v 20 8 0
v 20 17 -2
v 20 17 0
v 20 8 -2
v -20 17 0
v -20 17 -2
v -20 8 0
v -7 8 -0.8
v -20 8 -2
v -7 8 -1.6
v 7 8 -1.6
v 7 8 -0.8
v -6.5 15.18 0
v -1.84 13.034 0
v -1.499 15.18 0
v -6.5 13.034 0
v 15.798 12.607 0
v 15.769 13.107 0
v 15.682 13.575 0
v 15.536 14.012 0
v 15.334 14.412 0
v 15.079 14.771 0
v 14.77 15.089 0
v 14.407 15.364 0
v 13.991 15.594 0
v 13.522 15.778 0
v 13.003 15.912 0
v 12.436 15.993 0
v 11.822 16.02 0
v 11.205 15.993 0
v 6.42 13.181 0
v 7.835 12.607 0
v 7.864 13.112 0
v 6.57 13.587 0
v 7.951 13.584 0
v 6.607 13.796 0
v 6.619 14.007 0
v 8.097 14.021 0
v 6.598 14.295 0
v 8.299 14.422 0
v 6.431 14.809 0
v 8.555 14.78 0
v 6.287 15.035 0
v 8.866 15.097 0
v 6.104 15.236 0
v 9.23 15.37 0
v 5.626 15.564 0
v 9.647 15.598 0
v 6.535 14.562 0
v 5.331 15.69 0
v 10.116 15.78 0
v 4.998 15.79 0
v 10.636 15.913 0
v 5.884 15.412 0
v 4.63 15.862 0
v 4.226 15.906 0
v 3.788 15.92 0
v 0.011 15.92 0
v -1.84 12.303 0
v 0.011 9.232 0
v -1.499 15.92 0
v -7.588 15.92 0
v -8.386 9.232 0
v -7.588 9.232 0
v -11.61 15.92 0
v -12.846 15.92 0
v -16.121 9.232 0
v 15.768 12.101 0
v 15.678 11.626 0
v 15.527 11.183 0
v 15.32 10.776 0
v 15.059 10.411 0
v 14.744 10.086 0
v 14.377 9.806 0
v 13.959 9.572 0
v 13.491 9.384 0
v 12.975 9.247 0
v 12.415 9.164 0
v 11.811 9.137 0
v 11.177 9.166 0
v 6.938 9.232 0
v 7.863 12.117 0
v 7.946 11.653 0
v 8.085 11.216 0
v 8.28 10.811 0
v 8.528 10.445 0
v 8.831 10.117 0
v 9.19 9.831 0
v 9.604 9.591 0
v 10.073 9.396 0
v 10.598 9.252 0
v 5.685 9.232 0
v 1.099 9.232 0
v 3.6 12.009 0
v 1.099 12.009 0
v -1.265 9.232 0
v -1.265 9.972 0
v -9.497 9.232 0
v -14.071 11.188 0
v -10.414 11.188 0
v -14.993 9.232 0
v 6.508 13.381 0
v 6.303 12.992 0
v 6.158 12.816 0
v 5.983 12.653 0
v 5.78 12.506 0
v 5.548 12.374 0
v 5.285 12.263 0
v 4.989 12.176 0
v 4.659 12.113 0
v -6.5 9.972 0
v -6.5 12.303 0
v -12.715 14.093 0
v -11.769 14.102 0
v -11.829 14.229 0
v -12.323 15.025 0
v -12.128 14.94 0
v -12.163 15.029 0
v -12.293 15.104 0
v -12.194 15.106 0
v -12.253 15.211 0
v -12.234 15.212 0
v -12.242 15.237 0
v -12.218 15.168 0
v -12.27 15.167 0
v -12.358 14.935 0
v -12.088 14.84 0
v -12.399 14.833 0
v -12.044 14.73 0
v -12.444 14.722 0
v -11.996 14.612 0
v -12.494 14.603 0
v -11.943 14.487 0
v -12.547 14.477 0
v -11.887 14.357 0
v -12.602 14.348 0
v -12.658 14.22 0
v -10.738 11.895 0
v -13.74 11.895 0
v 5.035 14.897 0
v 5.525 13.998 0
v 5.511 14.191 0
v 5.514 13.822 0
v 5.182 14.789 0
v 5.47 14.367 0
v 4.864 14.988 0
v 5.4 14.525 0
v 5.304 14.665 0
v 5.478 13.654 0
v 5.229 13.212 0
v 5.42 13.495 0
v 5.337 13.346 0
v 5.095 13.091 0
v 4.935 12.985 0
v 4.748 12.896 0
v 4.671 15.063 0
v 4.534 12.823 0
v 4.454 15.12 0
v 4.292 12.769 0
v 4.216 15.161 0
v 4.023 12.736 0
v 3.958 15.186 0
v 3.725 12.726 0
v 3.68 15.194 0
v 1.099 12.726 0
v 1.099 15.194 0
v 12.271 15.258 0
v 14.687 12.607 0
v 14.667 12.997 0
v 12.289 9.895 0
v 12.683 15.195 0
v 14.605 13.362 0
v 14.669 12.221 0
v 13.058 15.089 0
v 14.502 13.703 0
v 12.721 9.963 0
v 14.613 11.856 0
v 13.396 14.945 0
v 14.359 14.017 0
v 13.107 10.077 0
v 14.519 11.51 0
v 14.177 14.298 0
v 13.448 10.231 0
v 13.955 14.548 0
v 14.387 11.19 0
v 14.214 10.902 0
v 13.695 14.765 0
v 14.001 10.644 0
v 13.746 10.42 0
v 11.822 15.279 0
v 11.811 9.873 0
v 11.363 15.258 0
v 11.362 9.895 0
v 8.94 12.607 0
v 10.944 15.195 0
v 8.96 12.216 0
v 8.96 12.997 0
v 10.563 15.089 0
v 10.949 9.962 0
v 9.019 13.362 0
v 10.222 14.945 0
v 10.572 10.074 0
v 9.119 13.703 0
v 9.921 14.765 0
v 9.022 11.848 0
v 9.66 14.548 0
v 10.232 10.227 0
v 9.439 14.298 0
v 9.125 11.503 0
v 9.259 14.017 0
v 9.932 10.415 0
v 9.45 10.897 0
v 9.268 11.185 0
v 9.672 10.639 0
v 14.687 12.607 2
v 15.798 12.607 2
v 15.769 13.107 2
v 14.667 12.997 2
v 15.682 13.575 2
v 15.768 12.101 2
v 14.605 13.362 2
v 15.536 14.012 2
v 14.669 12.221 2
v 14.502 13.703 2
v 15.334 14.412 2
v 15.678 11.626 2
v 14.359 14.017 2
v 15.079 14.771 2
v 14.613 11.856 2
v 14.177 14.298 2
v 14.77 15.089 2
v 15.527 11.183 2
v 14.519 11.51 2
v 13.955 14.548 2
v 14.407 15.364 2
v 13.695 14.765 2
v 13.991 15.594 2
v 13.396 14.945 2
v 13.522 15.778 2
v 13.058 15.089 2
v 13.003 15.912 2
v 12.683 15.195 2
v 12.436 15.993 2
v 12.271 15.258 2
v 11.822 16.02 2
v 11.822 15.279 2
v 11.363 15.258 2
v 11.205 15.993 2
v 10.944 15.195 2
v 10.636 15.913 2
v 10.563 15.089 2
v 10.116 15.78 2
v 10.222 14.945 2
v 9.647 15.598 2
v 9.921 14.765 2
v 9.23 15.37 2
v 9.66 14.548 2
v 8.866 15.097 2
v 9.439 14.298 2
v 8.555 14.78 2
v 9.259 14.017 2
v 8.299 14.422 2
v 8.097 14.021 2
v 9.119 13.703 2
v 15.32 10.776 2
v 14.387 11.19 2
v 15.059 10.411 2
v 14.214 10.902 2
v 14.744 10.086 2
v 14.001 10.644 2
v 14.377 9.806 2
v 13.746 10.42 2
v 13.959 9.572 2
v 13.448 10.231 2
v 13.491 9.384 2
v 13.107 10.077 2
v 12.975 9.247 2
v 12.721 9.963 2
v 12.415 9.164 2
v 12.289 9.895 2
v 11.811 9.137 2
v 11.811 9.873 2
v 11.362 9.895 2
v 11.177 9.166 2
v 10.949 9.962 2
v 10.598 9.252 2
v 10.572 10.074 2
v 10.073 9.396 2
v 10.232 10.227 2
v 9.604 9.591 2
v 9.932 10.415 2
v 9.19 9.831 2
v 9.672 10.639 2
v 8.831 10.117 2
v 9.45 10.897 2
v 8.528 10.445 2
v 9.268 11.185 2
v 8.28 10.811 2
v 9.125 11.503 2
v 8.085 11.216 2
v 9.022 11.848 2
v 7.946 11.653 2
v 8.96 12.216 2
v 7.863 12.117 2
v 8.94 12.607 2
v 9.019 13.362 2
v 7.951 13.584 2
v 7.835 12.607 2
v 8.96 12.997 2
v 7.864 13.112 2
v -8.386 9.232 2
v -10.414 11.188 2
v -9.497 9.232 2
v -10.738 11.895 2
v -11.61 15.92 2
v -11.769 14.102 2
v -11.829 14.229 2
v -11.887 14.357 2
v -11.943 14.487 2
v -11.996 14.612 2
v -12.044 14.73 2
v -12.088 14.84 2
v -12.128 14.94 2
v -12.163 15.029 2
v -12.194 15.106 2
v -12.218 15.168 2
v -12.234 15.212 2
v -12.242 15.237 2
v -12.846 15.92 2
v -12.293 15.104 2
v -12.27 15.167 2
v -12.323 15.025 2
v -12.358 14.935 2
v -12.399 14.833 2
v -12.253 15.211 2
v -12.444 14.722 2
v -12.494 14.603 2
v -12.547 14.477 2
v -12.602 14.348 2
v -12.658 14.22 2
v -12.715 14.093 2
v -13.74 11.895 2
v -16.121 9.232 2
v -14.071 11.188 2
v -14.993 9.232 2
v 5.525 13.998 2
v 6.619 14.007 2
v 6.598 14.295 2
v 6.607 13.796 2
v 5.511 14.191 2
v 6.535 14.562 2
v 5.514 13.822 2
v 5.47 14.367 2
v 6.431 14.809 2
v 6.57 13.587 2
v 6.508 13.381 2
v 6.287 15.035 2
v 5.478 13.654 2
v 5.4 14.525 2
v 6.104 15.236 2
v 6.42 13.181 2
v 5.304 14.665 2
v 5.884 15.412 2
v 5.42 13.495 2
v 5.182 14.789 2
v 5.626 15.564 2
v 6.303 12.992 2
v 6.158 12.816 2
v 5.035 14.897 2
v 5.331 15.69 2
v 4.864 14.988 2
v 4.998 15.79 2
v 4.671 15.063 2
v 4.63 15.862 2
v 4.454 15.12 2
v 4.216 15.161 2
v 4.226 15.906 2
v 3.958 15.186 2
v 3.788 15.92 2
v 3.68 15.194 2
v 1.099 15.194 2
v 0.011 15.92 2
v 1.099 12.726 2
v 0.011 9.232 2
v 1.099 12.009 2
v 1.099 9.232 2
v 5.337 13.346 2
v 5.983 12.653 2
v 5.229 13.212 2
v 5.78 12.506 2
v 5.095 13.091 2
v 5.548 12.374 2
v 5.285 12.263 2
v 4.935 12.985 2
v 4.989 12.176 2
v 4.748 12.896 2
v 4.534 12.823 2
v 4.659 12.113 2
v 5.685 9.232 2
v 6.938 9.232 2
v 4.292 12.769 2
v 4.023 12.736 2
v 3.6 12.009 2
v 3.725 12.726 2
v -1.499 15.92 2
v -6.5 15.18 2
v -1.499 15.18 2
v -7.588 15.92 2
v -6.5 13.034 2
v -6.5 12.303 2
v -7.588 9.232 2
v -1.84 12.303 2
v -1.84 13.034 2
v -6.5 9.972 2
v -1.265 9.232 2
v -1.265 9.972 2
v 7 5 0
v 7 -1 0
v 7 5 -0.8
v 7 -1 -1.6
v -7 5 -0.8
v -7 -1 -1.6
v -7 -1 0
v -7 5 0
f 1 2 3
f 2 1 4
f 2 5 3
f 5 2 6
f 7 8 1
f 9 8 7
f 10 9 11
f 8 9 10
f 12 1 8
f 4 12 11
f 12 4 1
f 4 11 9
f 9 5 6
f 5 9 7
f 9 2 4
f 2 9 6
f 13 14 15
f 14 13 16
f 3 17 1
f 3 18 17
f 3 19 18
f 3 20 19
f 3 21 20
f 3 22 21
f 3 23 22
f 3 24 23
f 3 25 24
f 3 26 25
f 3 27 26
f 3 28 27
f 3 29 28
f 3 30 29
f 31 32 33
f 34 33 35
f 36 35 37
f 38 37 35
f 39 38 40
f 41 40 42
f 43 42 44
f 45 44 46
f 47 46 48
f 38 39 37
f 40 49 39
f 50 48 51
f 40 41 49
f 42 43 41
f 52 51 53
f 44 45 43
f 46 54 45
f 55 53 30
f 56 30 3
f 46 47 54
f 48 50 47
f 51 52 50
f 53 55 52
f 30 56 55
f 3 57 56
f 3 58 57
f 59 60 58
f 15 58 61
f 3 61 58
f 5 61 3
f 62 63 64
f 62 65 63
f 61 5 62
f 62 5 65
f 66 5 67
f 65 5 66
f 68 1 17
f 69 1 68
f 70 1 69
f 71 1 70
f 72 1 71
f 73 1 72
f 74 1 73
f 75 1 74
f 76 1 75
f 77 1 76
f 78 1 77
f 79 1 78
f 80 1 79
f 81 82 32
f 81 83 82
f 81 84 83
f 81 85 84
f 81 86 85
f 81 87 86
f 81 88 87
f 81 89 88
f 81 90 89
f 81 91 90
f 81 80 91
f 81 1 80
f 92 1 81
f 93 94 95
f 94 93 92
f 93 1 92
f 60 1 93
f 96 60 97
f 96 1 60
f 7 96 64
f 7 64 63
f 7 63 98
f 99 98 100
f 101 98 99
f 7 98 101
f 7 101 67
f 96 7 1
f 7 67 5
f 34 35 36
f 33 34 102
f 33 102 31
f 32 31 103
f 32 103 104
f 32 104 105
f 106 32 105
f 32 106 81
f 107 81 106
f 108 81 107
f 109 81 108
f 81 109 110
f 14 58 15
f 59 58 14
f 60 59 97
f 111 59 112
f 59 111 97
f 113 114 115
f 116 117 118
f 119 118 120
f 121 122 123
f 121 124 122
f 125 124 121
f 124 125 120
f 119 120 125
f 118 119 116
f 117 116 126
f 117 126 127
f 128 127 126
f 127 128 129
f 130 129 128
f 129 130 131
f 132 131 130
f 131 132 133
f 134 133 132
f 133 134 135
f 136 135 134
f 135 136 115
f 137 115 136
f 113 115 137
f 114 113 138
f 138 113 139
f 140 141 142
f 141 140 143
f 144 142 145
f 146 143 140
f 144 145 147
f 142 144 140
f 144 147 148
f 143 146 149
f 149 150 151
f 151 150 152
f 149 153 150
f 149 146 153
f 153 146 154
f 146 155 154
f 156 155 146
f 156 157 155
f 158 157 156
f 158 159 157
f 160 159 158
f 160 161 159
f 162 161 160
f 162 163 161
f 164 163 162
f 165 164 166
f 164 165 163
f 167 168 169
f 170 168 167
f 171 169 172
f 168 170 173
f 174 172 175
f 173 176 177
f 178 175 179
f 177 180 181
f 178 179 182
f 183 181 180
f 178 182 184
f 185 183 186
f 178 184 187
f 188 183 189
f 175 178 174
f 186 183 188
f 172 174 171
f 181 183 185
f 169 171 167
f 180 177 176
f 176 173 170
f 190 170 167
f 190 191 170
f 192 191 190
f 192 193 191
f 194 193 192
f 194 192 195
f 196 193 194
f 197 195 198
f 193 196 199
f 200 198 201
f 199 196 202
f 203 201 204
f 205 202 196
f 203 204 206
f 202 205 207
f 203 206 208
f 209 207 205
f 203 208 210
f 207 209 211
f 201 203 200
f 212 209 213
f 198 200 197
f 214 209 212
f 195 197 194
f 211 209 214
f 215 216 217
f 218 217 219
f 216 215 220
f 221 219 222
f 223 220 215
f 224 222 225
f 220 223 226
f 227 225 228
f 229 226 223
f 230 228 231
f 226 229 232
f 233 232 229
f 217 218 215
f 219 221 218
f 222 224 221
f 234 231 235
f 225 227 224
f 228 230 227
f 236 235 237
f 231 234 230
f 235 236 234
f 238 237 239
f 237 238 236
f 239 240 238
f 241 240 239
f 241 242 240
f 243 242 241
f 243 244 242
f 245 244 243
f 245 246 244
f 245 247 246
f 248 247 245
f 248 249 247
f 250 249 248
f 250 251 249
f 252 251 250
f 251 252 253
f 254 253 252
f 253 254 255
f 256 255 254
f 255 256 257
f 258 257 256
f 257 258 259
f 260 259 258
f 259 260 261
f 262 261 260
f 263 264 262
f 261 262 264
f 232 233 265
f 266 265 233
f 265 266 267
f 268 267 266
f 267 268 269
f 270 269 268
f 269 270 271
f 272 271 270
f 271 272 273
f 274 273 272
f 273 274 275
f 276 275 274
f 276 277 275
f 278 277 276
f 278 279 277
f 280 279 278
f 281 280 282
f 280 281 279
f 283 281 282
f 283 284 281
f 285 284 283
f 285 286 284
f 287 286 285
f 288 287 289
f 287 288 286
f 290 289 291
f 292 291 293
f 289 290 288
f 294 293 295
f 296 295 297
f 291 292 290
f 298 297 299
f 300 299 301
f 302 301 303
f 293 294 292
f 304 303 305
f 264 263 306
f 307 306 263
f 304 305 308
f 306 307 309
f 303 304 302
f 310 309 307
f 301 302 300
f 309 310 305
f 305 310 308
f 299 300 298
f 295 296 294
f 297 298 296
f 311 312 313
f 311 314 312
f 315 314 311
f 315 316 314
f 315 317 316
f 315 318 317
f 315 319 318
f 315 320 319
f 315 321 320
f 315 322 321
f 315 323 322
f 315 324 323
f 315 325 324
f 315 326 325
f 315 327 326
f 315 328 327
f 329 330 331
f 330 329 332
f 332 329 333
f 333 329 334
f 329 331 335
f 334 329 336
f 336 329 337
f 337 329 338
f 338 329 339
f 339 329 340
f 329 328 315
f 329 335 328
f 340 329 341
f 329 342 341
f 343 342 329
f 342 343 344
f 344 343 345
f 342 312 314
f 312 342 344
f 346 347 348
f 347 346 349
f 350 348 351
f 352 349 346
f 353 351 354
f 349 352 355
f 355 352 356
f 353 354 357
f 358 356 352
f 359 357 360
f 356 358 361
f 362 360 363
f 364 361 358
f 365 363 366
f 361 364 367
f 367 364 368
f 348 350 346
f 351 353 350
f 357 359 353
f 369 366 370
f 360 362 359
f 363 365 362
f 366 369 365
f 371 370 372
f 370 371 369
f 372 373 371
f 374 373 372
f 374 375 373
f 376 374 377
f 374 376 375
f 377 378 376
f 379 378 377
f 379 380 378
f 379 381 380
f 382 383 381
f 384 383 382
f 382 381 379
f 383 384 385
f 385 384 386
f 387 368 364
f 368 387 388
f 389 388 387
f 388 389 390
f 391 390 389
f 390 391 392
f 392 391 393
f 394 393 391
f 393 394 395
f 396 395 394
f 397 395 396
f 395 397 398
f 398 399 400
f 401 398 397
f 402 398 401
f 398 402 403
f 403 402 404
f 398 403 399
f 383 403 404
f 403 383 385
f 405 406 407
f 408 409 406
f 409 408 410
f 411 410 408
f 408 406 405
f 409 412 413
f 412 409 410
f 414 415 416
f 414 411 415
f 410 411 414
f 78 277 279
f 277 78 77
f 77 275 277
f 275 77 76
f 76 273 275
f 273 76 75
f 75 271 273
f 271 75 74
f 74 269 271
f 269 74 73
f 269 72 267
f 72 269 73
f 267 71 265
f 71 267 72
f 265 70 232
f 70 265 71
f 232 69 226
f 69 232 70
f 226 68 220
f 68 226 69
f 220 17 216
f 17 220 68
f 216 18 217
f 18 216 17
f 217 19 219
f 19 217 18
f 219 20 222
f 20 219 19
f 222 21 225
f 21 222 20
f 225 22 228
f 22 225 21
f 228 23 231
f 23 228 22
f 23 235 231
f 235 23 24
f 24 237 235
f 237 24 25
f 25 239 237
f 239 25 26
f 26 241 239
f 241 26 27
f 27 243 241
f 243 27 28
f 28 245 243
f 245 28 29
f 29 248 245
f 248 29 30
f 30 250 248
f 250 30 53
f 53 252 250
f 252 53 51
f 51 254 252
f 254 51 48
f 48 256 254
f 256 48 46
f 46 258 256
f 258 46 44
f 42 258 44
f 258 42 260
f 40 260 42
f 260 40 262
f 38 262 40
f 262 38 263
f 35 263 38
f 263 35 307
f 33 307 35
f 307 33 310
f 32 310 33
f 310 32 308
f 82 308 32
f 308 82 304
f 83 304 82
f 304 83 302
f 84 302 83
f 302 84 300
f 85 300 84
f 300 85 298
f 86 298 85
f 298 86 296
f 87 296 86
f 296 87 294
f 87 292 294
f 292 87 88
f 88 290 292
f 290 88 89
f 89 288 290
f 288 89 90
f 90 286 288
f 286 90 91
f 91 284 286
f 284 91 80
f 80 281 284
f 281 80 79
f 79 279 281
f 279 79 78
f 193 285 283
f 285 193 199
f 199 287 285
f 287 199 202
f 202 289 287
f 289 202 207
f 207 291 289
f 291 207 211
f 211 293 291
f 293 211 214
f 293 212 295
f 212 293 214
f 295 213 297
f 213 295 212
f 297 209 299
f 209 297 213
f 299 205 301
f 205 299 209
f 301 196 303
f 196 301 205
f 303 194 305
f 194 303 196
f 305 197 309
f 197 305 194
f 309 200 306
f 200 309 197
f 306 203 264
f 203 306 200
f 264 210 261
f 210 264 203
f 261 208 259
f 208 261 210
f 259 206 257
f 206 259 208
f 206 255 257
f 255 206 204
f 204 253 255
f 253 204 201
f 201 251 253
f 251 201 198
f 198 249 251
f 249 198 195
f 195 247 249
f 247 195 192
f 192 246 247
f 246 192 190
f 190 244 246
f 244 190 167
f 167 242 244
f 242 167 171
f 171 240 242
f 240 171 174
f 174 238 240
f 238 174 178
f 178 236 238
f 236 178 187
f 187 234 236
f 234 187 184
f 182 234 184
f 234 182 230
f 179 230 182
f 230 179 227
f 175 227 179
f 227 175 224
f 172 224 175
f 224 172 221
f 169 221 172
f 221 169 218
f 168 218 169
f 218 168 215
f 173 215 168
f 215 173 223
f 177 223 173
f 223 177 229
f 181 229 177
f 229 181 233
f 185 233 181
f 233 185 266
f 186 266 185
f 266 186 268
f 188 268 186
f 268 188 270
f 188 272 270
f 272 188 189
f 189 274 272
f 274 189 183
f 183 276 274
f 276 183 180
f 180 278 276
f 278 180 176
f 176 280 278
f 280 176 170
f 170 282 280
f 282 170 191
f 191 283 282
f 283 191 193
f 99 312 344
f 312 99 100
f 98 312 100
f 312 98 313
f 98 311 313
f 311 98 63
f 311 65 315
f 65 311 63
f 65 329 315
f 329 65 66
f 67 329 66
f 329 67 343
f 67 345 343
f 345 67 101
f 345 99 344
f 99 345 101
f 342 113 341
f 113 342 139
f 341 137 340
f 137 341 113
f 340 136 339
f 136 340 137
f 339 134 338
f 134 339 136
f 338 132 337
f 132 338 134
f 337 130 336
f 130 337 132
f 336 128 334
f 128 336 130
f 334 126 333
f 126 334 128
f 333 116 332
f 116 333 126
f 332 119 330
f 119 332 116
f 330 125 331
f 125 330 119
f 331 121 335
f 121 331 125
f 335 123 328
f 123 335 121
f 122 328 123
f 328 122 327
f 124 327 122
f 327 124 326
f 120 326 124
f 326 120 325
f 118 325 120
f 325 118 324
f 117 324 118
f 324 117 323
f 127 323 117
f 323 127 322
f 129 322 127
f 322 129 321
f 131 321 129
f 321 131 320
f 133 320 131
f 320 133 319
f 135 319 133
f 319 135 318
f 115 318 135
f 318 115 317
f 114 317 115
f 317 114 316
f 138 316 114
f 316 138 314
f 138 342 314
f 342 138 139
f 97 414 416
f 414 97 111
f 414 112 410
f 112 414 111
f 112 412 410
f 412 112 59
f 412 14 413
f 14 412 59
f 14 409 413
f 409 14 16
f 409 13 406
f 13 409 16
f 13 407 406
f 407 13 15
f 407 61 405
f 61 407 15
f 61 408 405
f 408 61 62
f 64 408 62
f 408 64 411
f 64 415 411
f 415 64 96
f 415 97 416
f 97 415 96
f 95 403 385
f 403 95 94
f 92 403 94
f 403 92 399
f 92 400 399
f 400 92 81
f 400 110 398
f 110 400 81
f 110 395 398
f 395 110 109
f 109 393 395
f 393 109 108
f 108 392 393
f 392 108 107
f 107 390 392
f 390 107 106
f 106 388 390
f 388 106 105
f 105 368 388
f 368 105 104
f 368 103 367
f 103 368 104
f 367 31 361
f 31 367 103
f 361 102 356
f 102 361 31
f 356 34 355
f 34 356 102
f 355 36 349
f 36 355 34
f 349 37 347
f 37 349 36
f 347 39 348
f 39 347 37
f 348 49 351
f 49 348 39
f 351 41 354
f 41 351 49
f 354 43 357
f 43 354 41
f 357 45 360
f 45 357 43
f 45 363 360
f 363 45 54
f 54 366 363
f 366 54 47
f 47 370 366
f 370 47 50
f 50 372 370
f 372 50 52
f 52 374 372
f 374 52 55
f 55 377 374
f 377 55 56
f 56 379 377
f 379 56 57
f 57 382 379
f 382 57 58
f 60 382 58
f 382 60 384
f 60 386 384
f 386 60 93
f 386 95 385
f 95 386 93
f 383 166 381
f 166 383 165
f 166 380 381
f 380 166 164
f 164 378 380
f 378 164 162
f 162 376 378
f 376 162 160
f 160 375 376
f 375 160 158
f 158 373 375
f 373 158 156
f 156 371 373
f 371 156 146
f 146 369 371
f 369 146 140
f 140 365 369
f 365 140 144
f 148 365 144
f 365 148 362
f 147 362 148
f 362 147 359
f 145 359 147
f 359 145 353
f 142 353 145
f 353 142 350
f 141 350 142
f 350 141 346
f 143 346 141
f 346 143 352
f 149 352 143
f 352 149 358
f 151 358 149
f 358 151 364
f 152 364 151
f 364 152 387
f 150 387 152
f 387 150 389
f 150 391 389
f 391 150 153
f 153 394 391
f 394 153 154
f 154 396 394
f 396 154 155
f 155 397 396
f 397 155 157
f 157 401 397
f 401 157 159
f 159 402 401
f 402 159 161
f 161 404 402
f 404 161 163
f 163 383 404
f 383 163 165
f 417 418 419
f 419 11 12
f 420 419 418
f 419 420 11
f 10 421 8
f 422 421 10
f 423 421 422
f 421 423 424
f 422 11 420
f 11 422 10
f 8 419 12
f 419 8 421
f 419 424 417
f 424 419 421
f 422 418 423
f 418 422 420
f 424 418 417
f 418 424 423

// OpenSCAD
// Aero Dock Signage - KLG 2019

echo(version=version());

font = "Liberation Sans"; //["Liberation Sans", "Liberation Sans:style=Bold", "Liberation Sans:style=Italic", "Liberation Mono", "Liberation Serif"]

name = "AERO";
cube_w = 40;
cube_d = 2;
cube_h = 9;
letter_size = cube_h -2;
letter_height = cube_d*2;

o = cube_d / 2 - letter_height / 2;

rotate(-[90, 0, 0]) sign();

module letter(l) {
  // Use linear_extrude() to make the letters 3D objects as they
  // are only 2D shapes when only using text()
 scale([1.2,1,1])  linear_extrude(height = letter_height) {
    text(l, size = letter_size, font = font, halign = "center", valign = "center", $fn = 16);
  }
}

module sign() {

union() {
    translate([0, cube_d/2, 8+cube_h/2])
    {

     color("gray") cube([cube_w,cube_d,cube_h], center = true);   

    translate([0, -o, 0]) rotate([90, 0, 0]) letter(name);

}
 translate([0, 1.2, 6]) color("black") cube([14,0.8,4], center = true);
  translate([0, 0.8, 2]) color("gray") cube([14,1.6,6], center = true);
}
}
